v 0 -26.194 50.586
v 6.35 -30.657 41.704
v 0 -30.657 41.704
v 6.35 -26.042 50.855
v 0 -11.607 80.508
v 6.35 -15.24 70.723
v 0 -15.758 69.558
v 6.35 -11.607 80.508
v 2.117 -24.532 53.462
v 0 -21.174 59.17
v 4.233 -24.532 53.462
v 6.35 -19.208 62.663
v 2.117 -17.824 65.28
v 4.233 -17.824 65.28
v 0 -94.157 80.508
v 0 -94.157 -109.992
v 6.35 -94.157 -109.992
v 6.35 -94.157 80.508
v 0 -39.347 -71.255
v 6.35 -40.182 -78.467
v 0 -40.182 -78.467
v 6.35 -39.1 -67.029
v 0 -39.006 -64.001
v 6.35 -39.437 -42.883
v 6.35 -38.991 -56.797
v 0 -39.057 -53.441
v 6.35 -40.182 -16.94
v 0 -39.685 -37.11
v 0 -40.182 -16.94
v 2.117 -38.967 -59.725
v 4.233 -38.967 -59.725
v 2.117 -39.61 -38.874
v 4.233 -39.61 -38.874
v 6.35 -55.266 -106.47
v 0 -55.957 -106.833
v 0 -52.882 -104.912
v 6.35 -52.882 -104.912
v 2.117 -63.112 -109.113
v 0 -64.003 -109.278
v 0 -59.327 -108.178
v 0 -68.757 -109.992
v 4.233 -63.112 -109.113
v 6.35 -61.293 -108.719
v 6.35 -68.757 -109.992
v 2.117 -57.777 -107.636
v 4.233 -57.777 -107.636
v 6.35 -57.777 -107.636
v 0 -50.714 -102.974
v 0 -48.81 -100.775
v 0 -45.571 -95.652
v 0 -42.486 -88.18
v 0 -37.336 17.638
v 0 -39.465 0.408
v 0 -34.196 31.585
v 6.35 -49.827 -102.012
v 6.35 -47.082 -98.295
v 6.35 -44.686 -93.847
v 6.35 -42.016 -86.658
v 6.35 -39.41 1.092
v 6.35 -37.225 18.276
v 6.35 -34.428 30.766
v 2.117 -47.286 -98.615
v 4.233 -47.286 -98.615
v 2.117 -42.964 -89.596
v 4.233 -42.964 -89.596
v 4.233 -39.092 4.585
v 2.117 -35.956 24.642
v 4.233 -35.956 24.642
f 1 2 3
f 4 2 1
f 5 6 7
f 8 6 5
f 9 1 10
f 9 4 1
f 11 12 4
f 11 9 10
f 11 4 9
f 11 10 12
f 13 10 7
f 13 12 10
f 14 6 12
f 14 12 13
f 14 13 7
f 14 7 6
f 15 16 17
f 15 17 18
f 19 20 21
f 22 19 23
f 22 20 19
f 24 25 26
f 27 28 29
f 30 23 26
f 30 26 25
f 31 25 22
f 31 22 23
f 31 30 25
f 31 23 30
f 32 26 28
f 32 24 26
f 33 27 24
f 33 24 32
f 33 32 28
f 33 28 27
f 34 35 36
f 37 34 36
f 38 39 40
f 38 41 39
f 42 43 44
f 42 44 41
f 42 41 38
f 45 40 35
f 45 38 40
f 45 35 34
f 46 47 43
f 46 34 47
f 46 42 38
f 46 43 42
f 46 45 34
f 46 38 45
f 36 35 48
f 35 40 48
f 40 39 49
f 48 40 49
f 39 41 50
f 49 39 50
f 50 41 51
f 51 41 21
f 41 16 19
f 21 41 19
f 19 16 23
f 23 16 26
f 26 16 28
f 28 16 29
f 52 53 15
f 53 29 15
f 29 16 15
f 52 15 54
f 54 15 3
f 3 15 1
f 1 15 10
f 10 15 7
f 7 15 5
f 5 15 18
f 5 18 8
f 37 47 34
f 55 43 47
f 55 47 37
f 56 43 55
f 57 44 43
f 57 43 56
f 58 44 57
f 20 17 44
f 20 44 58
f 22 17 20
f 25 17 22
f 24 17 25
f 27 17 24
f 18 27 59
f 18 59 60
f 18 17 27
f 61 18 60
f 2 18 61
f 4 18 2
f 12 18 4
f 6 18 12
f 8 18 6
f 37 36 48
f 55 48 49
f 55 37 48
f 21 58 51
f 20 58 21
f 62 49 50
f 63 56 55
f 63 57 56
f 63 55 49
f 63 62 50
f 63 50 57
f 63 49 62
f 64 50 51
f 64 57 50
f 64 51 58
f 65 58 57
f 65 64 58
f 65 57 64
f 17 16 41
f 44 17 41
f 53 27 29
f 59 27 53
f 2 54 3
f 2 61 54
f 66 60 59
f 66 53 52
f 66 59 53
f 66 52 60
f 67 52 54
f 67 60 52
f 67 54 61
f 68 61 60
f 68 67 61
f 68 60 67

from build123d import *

# Parameters (mm, degrees)
F0_W     = 82.55
F0_H     = 190.5
F1_DEPTH = 6.35
F2_W     = 22.225
F2_H     = 5.08
F2_W_2   = 19.05
F2_H_2   = 26.4446459055
F2_H_3   = 61.5272244272
F2_H_4   = 58.6440721527
F3_DEPTH = 12.7


# Not quite as in the source:
# - a feature names something its author has since deleted; it is built from what else it names


with BuildPart() as f1:
    # F0 (on Right) → F1 (new body)
    with BuildSketch(Plane.YZ):
        with Locations((-52.8816960618, -14.7416193426)):
            Rectangle(F0_W, F0_H)
    extrude(amount=F1_DEPTH)

    # F2 (on face) → F3 (cut)
    with BuildSketch(Plane.YZ.offset(6.35)):
        with BuildLine():
            add(Edge.make_bspline(
                [(-52.8816960618, -104.9116193426), (-46.7384052574, -100.1821825443), (-42.1059434018, -90.4449211167), (-40.1816960618, -78.4669734371)],
                knots=[0.1290930094, 0.1290930094, 0.1290930094, 0.1290930094, 0.3003556222, 0.3003556222, 0.3003556222, 0.3003556222], degree=3))
            Line((-52.8816960618, -104.9116193426), (-30.6566960618, -104.9116193426))
            Line((-30.6566960618, -104.9116193426), (-30.6566960618, -78.4669734371))
            Line((-30.6566960618, -78.4669734371), (-40.1816960618, -78.4669734371))
        make_face()
        with Locations((-41.7691960618, -107.4516193426)):
            Rectangle(F2_W, F2_H)
        with BuildLine():
            add(Edge.make_bspline(
                [(-68.7566960618, -109.9916193426), (-63.0013923205, -109.1961470607), (-57.5123383521, -108.4765376811), (-52.8816960618, -104.9116193426)],
                knots=[0, 0, 0, 0, 0.1290930094, 0.1290930094, 0.1290930094, 0.1290930094], degree=3))
            Line((-68.7566960618, -109.9916193426), (-52.8816960618, -109.9916193426))
            Line((-52.8816960618, -109.9916193426), (-52.8816960618, -104.9116193426))
        make_face()
        with Locations((-21.1316960618, -107.4516193426)):
            Rectangle(F2_W_2, F2_H)
        with Locations((-21.1316960618, -91.6892963898)):
            Rectangle(F2_W_2, F2_H_2)
        with Locations((-21.1316960618, -47.7033612235)):
            Rectangle(F2_W_2, F2_H_3)
        with BuildLine():
            add(Edge.make_bspline(
                [(-40.1816960618, -78.4669734371), (-37.3949778969, -61.1203653983), (-40.2882470853, -39.0743255012), (-40.1816960618, -16.9397490099)],
                knots=[0.3003556222, 0.3003556222, 0.3003556222, 0.3003556222, 0.5483802, 0.5483802, 0.5483802, 0.5483802], degree=3))
            Line((-40.1816960618, -78.4669734371), (-30.6566960618, -78.4669734371))
            Line((-30.6566960618, -78.4669734371), (-30.6566960618, -16.9397490099))
            Line((-30.6566960618, -16.9397490099), (-40.1816960618, -16.9397490099))
        make_face()
        with BuildLine():
            add(Edge.make_bspline(
                [(-40.1816960618, -16.9397490099), (-40.0769921004, 4.8111245801), (-37.0755702459, 26.6474918057), (-30.6566960618, 41.7043231428)],
                knots=[0.5483802, 0.5483802, 0.5483802, 0.5483802, 0.7921052716, 0.7921052716, 0.7921052716, 0.7921052716], degree=3))
            Line((-40.1816960618, -16.9397490099), (-30.6566960618, -16.9397490099))
            Line((-30.6566960618, -16.9397490099), (-30.6566960618, 41.7043231428))
        make_face()
        with Locations((-21.1316960618, 12.3822870664)):
            Rectangle(F2_W_2, F2_H_4)
        with BuildLine():
            add(Edge.make_bspline(
                [(-30.6566960618, 41.7043231428), (-25.1814690079, 54.5476299155), (-17.2197388458, 62.4582162191), (-11.6066960618, 80.5083806574)],
                knots=[0.7921052716, 0.7921052716, 0.7921052716, 0.7921052716, 1, 1, 1, 1], degree=3))
            Line((-30.6566960618, 41.7043231428), (-11.6066960618, 41.7043231428))
            Line((-11.6066960618, 41.7043231428), (-11.6066960618, 80.5083806574))
        make_face()
    extrude(amount=-F3_DEPTH, mode=Mode.SUBTRACT)


solid = f1.part
